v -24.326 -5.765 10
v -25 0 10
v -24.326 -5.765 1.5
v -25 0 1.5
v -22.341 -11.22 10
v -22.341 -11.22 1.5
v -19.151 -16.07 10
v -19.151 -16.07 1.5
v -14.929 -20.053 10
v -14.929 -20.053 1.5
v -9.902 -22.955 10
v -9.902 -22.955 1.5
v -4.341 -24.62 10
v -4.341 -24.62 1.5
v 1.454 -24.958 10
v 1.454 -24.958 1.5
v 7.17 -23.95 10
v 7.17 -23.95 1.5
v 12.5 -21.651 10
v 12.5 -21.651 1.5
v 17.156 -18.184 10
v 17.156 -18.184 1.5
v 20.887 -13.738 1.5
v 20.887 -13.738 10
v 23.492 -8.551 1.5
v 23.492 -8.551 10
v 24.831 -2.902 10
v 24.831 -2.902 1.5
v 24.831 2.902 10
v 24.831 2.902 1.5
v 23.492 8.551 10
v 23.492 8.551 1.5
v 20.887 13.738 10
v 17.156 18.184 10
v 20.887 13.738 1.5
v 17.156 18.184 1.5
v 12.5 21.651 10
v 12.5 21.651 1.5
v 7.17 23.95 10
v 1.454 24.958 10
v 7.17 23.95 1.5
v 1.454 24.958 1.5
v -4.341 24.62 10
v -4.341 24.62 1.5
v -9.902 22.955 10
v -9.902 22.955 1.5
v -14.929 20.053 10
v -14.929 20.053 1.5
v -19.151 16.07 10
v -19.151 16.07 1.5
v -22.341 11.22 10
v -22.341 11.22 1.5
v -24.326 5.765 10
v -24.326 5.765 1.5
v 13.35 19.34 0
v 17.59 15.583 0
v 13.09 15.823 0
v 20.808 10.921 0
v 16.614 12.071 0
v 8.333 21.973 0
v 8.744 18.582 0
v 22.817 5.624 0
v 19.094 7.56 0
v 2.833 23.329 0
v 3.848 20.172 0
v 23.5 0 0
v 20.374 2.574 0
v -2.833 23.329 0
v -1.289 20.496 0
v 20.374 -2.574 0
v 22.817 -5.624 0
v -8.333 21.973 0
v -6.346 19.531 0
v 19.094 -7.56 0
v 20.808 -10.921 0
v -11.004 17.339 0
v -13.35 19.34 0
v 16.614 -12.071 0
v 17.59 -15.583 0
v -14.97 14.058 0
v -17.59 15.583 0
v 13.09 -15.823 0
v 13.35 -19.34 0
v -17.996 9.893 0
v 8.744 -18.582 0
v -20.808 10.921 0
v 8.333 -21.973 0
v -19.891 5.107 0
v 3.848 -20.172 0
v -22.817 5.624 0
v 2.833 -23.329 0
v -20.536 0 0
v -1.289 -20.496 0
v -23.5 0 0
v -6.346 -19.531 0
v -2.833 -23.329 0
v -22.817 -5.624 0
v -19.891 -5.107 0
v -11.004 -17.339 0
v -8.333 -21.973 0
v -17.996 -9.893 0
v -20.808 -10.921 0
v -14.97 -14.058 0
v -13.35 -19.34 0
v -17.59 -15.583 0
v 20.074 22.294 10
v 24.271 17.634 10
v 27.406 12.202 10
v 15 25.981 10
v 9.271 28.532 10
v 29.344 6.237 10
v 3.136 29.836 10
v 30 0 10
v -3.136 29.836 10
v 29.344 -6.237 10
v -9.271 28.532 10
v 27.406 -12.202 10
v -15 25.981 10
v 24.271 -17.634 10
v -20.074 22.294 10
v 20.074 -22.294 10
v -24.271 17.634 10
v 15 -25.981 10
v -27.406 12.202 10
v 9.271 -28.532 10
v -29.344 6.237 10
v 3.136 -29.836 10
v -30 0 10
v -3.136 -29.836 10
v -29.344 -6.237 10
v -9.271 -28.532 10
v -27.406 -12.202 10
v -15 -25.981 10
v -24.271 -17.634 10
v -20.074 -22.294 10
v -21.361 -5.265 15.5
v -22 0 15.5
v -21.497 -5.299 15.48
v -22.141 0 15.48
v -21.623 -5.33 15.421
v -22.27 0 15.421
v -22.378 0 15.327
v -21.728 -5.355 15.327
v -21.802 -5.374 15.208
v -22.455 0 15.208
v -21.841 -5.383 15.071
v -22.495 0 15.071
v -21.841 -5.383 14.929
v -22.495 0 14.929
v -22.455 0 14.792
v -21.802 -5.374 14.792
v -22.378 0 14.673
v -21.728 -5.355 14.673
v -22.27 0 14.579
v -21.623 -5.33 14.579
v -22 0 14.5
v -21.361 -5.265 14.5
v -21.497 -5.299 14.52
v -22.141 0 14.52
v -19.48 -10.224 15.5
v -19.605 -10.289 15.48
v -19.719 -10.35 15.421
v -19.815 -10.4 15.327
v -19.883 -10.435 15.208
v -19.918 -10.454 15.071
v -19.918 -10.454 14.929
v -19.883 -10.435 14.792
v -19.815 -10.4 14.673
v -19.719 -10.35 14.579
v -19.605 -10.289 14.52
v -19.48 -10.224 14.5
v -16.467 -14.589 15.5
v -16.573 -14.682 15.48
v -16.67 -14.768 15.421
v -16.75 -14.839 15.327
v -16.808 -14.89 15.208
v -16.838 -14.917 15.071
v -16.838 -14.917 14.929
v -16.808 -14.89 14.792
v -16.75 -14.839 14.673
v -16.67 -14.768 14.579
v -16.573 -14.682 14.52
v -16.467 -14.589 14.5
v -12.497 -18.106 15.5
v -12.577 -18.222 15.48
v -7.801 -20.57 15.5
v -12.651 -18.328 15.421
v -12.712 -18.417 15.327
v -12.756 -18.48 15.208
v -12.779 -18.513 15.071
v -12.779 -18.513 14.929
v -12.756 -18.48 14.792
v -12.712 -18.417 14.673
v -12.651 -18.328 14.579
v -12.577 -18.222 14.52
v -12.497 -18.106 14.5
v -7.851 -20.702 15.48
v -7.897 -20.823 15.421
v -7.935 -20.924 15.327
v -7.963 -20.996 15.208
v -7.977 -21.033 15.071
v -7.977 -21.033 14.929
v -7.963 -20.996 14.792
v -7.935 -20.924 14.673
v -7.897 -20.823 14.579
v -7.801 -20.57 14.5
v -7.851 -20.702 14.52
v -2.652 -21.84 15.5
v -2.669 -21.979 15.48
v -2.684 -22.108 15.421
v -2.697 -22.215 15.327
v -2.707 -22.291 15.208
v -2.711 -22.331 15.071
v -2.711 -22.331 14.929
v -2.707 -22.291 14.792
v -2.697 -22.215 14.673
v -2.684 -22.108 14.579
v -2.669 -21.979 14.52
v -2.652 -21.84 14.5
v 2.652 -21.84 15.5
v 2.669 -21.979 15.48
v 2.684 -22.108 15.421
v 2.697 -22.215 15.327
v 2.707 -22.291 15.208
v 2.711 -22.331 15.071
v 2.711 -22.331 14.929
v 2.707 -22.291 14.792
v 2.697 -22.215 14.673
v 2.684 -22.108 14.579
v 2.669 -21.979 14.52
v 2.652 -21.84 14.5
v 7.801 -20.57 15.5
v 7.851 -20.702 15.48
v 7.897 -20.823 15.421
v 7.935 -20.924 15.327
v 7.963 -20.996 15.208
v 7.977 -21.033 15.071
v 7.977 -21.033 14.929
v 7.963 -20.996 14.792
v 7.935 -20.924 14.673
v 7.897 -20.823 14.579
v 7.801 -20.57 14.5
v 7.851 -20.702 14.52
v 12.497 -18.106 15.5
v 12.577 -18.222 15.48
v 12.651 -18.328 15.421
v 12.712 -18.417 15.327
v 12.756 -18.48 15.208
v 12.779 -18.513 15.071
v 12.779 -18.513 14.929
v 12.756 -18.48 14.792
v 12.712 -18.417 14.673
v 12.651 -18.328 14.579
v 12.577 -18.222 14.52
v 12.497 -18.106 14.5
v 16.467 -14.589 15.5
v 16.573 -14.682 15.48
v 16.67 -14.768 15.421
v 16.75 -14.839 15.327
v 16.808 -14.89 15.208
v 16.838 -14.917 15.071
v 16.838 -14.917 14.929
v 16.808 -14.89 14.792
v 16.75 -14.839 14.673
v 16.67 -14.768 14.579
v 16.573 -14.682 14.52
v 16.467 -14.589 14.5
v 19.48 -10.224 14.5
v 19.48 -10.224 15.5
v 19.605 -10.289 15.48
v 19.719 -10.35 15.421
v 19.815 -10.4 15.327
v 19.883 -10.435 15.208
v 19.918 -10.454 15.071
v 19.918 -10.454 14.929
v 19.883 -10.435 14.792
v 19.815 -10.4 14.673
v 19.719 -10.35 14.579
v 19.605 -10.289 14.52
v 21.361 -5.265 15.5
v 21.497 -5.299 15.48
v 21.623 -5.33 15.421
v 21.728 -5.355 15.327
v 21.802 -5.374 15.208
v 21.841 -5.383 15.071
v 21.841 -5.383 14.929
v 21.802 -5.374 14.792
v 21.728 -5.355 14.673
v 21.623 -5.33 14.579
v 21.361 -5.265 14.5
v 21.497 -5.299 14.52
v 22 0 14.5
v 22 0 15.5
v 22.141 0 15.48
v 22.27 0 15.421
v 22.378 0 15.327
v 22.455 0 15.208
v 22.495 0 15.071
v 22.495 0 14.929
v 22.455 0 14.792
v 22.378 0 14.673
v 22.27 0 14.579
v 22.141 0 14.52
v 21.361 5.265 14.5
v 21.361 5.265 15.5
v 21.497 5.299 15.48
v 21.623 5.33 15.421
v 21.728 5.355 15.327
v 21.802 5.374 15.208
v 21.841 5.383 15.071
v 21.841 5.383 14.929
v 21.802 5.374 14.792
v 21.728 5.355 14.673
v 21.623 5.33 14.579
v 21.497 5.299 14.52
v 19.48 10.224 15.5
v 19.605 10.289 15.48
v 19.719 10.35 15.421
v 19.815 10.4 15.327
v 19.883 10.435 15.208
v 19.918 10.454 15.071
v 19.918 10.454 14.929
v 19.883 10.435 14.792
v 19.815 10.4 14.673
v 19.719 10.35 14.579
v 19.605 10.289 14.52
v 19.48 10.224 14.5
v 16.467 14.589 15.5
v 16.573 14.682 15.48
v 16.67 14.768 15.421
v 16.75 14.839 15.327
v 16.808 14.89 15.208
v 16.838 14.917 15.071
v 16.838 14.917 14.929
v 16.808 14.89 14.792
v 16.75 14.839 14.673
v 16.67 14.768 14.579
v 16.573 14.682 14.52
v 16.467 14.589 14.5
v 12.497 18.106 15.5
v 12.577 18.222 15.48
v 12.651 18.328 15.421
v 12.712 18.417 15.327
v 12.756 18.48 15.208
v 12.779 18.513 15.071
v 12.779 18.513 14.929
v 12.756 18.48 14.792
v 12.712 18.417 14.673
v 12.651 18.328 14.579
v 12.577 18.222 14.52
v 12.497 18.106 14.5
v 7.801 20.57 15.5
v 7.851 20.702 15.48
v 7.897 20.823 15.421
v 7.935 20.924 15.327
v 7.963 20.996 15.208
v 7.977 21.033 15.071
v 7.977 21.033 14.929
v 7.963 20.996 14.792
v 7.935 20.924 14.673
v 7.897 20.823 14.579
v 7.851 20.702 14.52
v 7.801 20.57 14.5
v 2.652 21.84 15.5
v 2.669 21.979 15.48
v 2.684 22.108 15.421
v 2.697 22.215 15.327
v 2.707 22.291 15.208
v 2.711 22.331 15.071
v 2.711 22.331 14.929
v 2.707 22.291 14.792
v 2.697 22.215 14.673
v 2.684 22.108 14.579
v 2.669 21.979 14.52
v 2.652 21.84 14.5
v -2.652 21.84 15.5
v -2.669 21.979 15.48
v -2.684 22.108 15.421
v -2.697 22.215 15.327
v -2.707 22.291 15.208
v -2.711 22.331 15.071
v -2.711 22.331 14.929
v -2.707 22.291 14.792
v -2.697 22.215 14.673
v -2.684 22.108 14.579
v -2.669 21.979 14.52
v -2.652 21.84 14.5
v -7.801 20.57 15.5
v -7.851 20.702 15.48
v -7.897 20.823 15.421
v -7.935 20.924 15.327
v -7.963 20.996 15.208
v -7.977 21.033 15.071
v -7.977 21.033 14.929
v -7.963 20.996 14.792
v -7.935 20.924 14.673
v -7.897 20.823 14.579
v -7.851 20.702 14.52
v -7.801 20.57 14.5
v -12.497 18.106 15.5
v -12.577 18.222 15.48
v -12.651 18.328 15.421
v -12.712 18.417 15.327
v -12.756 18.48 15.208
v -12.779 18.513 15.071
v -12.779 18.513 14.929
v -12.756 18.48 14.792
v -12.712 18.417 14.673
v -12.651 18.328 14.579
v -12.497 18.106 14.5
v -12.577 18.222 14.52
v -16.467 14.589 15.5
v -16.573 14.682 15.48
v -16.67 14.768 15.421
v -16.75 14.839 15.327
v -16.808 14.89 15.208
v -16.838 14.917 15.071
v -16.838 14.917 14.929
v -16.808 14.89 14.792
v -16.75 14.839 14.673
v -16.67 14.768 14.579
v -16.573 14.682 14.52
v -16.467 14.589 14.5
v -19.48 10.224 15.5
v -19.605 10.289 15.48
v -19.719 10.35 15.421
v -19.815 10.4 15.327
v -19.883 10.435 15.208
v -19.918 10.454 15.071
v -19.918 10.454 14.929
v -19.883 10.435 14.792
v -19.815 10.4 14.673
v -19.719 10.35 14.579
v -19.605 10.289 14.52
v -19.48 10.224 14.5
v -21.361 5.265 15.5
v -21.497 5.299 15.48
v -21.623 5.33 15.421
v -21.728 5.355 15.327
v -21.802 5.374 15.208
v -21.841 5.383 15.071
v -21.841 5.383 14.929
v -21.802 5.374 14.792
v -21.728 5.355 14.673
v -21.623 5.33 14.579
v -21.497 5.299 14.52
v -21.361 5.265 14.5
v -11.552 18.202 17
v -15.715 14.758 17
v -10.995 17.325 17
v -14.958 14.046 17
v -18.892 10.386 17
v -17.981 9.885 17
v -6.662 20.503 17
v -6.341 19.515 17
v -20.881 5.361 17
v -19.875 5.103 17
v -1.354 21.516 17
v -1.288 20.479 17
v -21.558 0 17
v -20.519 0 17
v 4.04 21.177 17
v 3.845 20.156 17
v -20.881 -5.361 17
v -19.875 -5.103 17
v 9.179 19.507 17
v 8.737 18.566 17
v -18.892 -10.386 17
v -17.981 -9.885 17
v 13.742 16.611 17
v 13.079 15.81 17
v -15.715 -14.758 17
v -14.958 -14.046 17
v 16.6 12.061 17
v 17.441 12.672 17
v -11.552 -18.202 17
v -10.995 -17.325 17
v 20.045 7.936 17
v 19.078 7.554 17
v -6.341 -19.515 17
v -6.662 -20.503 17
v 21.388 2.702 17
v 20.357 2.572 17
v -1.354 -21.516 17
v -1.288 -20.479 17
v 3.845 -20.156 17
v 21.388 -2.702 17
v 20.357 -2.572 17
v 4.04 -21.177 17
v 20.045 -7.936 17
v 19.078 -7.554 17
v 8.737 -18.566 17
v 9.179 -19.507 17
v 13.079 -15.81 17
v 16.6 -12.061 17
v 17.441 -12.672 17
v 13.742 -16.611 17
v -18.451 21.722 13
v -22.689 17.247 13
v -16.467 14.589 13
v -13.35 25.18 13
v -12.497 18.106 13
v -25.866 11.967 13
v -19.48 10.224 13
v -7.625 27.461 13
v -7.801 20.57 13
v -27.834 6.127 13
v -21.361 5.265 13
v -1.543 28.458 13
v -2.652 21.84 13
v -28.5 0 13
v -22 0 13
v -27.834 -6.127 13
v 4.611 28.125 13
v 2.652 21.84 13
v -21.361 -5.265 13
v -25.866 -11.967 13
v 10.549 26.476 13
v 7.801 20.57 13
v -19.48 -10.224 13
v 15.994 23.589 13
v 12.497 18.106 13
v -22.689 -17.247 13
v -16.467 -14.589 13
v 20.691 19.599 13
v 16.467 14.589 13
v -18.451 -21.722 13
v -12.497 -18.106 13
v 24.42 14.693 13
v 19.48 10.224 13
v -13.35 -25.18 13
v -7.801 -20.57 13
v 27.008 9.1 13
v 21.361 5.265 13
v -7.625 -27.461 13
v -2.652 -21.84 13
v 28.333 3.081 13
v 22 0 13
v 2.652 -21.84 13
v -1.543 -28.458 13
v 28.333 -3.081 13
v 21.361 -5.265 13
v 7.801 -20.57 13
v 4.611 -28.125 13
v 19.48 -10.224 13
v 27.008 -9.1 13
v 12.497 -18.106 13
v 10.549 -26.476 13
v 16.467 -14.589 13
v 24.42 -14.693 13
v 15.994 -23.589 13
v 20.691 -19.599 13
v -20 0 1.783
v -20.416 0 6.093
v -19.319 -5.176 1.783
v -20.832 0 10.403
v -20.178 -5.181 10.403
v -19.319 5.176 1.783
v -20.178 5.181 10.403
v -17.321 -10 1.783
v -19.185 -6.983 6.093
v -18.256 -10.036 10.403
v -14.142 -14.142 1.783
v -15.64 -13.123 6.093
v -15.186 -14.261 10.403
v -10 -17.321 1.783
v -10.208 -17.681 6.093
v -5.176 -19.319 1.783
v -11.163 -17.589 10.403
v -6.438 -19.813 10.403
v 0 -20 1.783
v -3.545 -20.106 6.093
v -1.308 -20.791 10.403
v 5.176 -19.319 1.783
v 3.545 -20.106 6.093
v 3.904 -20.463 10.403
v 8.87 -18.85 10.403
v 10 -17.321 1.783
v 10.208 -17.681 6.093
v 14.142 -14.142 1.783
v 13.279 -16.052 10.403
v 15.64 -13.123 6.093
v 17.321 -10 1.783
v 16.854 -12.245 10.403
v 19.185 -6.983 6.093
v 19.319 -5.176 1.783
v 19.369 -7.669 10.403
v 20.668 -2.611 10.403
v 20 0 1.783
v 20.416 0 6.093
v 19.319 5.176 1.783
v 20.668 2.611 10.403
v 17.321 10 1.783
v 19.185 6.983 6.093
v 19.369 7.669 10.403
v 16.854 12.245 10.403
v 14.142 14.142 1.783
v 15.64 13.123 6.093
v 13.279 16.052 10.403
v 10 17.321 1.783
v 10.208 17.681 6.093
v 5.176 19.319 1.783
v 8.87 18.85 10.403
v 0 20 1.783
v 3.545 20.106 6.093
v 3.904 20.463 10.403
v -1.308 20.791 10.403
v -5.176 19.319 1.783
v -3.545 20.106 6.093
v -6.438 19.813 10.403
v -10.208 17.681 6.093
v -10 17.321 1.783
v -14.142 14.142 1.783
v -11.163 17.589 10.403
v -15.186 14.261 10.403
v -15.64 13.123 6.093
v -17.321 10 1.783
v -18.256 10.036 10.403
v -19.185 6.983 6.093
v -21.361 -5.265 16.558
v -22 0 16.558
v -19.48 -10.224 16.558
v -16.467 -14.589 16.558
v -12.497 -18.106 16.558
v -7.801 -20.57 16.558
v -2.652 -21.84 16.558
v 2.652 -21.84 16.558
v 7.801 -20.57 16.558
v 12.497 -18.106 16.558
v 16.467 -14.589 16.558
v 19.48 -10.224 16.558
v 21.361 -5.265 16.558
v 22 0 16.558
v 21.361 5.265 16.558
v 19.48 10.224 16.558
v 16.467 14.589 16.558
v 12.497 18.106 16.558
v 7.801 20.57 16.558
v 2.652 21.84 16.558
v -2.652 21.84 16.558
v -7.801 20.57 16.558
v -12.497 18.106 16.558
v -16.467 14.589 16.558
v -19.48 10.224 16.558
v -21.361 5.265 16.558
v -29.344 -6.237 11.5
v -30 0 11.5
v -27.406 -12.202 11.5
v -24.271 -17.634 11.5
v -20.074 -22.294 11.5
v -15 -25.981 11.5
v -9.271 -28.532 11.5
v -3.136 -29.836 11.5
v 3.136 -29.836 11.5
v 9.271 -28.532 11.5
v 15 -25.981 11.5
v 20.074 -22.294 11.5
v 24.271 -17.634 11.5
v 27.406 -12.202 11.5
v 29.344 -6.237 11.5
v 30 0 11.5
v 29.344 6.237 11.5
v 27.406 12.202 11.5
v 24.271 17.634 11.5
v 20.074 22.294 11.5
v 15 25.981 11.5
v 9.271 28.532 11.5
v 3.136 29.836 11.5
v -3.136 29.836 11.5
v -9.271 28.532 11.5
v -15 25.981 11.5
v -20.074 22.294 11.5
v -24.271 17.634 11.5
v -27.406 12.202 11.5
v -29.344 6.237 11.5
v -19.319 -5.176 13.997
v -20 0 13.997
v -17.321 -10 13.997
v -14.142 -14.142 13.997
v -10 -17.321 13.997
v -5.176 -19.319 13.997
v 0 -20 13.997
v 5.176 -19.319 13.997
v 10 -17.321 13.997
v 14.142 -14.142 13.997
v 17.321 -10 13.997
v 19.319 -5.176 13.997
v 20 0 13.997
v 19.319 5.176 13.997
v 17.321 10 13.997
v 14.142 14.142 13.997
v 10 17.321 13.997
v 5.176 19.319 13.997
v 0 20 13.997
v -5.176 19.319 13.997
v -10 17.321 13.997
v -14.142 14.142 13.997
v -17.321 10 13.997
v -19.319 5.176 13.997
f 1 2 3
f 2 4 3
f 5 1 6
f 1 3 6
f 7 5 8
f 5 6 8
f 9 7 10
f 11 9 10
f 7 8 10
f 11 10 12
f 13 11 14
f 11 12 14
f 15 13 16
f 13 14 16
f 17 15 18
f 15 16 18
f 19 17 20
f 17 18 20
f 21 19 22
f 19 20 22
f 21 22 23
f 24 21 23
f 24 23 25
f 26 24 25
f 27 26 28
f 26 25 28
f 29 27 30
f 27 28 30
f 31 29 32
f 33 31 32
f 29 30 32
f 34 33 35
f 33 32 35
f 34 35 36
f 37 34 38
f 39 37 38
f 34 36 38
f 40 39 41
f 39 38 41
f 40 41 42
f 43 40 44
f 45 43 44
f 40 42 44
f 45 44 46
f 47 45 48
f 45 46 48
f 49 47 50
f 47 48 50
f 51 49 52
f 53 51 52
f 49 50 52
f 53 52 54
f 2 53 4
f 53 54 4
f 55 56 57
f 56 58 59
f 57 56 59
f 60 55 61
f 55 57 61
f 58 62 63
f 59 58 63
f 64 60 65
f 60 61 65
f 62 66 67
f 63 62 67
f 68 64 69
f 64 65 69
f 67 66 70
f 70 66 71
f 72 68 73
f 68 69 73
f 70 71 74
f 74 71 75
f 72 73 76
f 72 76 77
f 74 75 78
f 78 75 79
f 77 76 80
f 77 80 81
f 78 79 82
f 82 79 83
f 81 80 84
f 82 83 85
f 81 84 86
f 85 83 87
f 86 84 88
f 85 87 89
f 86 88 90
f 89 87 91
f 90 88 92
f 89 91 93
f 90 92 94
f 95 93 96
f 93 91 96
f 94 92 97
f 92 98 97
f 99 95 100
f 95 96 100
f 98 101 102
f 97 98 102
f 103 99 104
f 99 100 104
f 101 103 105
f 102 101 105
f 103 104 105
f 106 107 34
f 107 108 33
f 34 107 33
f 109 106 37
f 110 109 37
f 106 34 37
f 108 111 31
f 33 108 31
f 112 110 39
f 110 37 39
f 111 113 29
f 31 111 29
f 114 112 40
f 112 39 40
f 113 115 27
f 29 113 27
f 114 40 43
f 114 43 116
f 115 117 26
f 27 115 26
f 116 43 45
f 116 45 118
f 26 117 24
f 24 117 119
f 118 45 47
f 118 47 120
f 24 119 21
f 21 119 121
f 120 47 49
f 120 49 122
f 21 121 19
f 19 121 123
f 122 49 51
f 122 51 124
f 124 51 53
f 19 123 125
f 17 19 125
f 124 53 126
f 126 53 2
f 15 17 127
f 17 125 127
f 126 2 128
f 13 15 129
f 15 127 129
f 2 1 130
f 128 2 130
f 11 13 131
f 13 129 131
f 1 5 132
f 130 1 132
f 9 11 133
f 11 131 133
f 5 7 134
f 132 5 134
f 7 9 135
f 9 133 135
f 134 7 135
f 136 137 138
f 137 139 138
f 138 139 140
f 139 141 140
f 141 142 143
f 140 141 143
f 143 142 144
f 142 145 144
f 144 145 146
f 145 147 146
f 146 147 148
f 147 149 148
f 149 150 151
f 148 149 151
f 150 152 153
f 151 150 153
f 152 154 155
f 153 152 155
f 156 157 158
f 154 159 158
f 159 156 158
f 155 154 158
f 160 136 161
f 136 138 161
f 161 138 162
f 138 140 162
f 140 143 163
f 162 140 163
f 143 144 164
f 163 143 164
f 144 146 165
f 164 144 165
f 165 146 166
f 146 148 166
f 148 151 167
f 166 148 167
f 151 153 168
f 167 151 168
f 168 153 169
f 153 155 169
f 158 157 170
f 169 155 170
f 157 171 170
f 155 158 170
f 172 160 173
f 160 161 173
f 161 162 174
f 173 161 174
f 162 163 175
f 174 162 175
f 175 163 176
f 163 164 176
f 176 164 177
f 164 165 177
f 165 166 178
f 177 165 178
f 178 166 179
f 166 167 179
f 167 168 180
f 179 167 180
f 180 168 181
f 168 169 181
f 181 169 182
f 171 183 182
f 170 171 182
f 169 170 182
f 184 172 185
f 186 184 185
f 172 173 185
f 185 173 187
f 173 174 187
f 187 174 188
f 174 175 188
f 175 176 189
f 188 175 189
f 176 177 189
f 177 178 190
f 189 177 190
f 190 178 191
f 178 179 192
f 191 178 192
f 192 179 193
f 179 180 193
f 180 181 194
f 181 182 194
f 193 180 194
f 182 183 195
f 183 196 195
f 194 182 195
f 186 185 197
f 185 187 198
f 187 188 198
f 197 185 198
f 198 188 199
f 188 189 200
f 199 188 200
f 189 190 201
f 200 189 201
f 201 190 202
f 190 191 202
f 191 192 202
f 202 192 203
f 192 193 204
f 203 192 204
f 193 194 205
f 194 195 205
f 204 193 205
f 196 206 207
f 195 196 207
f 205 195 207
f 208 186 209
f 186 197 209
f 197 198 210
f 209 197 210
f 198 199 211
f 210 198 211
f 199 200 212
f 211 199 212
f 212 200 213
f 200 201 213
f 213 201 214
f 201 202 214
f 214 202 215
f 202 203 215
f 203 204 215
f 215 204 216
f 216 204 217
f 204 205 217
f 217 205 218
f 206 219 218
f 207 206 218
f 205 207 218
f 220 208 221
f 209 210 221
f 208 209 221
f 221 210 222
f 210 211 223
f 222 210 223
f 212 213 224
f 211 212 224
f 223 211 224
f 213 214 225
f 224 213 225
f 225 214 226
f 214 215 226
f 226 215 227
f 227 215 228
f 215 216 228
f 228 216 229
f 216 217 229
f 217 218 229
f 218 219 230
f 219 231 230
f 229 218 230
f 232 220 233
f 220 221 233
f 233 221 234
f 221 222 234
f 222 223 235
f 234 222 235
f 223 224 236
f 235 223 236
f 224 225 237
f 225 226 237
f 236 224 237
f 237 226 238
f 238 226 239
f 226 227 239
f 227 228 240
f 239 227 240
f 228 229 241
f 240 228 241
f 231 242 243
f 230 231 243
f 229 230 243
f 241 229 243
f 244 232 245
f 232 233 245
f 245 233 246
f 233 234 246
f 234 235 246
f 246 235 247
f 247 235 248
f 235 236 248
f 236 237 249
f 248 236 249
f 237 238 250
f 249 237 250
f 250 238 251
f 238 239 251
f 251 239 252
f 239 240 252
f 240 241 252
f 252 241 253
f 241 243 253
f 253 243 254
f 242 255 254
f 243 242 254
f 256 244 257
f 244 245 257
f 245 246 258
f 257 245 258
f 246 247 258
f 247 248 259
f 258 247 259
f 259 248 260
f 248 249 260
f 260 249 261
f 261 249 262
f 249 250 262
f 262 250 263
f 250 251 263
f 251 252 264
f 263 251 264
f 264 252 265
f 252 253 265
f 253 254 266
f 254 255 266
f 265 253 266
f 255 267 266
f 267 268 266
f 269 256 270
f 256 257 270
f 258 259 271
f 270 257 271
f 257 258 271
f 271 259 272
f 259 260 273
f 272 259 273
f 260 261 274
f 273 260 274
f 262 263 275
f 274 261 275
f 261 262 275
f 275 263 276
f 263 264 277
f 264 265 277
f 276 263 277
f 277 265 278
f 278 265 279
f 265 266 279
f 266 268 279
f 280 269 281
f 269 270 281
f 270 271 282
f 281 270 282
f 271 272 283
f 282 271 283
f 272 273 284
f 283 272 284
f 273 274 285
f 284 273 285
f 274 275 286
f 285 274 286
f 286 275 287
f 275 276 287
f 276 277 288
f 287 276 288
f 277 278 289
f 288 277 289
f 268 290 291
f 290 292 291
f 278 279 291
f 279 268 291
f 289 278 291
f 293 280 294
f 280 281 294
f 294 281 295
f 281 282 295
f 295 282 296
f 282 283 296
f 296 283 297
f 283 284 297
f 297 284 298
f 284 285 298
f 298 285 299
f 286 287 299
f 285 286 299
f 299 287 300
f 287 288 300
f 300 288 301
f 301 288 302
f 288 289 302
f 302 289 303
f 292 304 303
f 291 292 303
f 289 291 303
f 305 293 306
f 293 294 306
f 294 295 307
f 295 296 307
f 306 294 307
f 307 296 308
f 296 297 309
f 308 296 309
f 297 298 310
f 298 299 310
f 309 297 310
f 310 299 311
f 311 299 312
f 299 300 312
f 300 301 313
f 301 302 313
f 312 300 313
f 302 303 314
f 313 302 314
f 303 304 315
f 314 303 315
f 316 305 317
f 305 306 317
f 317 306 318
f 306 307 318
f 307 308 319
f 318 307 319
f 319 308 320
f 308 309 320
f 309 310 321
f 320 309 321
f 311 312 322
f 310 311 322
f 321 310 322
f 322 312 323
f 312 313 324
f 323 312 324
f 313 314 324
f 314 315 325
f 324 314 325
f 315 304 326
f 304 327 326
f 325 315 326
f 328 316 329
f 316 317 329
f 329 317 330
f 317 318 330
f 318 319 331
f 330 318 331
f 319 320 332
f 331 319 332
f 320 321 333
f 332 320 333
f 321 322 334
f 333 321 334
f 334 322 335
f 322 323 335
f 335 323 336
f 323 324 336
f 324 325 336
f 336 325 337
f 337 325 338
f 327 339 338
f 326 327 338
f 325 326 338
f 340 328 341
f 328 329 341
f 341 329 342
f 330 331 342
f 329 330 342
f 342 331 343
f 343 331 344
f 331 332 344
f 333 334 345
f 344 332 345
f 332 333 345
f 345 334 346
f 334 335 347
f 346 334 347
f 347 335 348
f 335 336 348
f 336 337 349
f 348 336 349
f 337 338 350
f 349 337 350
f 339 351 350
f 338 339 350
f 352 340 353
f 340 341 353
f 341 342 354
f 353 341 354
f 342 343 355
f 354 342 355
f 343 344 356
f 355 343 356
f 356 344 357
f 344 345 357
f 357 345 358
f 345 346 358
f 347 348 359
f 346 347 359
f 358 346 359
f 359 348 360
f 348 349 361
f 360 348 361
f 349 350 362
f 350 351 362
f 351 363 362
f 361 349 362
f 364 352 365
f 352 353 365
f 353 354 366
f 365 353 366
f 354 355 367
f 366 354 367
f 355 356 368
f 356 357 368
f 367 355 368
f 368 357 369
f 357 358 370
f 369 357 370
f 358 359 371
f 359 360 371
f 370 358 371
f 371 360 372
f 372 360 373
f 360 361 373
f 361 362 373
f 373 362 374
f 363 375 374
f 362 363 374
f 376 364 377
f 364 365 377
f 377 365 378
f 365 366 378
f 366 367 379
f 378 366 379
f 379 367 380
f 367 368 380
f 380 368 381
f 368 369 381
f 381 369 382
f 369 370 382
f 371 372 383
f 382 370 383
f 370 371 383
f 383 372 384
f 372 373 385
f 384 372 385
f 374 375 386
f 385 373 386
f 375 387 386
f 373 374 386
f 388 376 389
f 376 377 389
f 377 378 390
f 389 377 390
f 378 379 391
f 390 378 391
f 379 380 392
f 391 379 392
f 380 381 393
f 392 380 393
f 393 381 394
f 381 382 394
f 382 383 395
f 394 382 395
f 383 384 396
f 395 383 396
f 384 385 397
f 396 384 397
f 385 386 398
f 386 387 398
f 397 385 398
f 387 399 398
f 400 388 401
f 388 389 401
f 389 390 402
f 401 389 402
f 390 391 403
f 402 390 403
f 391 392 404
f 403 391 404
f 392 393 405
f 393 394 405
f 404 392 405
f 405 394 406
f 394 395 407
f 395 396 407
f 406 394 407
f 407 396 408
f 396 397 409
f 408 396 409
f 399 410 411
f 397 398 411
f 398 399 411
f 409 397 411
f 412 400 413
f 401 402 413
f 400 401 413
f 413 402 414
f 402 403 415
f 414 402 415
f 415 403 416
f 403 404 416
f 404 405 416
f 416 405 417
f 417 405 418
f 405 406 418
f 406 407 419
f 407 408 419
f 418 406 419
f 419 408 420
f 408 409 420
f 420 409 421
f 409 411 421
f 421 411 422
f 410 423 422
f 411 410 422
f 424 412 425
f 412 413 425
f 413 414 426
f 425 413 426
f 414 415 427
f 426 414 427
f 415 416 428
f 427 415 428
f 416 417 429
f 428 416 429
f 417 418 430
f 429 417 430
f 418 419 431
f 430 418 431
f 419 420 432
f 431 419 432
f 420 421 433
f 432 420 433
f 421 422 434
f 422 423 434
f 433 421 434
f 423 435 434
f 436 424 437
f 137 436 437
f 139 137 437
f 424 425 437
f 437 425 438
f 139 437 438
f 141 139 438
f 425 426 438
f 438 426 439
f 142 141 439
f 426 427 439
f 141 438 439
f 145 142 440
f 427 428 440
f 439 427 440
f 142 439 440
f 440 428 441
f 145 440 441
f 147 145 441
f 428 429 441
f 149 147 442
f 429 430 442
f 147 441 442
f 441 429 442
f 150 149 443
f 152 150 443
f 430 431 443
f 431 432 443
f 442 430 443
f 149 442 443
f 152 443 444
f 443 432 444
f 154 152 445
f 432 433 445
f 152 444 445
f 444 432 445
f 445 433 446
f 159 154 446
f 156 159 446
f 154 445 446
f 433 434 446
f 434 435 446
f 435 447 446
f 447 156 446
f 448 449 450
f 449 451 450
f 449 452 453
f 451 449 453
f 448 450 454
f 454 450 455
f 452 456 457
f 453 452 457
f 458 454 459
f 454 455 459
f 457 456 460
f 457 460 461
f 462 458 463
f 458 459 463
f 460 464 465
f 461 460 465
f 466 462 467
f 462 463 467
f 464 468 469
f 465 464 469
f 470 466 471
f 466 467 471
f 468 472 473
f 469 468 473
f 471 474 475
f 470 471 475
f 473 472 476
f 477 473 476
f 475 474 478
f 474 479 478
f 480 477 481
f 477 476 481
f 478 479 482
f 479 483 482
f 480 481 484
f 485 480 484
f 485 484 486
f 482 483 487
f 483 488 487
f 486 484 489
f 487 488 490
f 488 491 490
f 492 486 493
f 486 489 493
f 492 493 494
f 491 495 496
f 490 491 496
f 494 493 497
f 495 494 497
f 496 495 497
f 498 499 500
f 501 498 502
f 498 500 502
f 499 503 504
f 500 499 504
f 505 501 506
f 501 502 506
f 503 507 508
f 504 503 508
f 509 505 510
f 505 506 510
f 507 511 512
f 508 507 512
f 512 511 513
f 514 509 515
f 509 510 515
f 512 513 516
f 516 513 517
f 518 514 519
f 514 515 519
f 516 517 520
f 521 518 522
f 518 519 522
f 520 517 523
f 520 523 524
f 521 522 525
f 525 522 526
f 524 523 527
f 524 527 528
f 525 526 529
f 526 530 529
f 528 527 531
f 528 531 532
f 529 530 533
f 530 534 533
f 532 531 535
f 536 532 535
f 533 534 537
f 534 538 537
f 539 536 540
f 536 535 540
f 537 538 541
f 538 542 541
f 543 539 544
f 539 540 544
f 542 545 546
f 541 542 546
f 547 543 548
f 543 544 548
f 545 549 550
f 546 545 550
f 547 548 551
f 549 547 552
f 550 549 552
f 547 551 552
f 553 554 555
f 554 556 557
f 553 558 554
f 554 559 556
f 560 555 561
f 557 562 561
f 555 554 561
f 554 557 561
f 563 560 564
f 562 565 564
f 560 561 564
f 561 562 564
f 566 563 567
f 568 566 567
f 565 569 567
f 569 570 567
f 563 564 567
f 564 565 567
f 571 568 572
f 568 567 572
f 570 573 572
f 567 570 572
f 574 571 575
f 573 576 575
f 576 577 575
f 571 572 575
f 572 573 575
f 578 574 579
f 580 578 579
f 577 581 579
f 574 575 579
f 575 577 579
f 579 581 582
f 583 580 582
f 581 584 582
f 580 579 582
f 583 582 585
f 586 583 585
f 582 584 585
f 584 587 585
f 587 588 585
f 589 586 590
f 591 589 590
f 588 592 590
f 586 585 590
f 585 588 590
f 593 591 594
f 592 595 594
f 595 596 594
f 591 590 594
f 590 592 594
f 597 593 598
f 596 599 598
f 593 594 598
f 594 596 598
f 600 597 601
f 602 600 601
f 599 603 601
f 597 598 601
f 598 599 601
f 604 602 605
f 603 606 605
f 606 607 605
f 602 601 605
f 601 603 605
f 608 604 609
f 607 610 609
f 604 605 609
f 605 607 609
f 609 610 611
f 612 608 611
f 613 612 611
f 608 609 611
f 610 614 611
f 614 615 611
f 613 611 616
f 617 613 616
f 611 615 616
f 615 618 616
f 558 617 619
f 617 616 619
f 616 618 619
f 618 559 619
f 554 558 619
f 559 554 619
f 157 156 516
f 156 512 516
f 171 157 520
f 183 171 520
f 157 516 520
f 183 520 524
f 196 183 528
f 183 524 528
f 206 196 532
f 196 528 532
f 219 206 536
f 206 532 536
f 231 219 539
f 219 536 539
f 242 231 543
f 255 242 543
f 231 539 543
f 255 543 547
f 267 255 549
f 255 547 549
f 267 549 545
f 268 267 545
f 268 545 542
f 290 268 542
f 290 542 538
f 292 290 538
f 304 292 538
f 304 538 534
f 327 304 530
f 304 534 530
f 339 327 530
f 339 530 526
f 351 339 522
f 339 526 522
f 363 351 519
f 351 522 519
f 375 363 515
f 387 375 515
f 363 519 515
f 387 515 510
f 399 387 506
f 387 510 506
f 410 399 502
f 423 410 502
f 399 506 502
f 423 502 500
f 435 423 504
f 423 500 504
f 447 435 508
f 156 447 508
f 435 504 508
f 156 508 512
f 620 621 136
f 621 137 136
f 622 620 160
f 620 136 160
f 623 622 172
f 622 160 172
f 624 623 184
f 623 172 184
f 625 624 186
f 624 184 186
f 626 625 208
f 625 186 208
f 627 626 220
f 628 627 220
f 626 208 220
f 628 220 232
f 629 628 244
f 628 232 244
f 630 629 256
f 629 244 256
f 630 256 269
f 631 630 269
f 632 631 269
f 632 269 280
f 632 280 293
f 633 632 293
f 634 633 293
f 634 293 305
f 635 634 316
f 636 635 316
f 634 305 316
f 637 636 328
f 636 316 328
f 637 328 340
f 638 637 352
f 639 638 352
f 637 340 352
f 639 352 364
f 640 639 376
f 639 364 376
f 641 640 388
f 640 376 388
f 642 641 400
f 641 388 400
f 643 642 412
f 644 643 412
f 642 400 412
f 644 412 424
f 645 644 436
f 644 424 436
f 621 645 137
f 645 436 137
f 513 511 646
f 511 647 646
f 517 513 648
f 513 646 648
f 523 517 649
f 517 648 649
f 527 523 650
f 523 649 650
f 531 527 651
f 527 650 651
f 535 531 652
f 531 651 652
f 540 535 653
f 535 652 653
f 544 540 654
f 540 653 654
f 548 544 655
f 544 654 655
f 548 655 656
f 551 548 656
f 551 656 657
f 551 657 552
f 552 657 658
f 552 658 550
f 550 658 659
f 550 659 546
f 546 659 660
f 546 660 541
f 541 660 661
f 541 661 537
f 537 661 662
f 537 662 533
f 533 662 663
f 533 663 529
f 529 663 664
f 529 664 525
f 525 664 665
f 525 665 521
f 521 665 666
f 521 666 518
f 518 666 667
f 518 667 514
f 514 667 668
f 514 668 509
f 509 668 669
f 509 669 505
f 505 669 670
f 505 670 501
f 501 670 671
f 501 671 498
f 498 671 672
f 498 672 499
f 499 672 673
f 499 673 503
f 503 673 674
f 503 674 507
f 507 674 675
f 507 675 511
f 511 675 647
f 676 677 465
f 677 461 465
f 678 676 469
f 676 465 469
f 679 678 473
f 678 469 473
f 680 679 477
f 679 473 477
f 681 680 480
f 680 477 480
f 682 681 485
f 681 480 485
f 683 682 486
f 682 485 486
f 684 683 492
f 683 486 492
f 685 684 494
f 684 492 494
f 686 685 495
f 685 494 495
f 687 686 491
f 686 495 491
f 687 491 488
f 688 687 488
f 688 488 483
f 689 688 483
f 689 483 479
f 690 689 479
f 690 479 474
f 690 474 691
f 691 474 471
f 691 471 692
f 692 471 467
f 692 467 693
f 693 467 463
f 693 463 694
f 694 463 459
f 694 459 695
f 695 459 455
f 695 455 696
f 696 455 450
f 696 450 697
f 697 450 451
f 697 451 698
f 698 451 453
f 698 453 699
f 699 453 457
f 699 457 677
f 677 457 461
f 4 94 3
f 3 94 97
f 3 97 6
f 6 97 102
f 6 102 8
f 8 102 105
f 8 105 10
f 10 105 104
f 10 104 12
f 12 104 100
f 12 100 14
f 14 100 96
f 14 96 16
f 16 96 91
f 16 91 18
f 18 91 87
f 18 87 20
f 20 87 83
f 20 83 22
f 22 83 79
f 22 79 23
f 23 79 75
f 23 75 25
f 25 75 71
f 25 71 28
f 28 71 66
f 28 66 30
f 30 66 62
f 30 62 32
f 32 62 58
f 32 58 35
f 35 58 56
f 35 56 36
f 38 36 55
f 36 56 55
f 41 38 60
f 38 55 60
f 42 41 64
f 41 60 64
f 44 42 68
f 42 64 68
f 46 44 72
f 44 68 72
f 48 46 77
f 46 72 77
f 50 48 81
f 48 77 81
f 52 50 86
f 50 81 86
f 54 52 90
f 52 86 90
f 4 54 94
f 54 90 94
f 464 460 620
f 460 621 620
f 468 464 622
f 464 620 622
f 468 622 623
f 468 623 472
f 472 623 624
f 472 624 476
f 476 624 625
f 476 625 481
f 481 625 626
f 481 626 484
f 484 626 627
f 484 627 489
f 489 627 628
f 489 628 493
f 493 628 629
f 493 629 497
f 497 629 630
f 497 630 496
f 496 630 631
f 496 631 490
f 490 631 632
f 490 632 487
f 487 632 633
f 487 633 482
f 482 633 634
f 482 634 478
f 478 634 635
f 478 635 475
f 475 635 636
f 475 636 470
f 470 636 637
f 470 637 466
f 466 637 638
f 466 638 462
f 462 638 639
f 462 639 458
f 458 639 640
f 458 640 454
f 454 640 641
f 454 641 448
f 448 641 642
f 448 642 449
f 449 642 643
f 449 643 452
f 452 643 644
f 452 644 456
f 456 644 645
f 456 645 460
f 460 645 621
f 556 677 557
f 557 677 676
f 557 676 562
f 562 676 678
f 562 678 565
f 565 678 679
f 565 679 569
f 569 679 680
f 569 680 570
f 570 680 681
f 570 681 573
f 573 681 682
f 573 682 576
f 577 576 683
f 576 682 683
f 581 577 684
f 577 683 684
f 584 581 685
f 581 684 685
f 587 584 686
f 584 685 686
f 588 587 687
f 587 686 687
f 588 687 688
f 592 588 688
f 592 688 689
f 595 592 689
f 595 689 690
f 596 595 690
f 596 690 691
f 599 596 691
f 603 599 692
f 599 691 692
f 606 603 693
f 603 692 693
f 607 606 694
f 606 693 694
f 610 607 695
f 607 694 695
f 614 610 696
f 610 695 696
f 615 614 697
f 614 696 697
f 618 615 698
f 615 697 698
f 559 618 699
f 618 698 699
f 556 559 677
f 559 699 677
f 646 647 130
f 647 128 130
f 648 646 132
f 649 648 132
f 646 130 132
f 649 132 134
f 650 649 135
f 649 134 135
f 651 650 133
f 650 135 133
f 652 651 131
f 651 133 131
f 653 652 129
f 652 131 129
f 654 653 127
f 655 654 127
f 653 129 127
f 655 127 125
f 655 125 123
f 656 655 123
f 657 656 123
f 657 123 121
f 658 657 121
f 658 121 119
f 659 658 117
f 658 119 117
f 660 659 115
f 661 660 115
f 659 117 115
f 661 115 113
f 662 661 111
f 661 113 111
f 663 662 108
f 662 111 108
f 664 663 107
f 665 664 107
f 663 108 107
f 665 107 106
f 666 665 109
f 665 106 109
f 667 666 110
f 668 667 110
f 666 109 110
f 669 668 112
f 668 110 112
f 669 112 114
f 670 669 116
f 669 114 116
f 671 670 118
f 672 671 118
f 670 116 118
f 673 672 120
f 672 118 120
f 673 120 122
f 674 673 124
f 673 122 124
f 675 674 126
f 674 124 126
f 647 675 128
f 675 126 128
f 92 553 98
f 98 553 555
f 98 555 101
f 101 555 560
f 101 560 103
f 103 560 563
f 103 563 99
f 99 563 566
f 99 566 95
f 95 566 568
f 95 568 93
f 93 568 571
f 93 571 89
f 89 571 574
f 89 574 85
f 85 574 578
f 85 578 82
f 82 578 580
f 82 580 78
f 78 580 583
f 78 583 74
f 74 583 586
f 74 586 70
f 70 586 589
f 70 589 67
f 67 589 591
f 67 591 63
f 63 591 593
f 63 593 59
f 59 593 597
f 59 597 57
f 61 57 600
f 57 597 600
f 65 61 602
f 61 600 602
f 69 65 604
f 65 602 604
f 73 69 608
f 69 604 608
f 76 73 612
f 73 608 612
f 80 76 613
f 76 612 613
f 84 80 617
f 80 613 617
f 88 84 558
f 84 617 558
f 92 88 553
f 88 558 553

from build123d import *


with BuildPart() as f1:
    # F0 (on Front) → F1 (revolve)
    with BuildSketch(Plane.XZ):
        with BuildLine():
            Line((-23.5, 0), (-20.53616, 0))
            Line((-20.53616, 0), (-20, 1.783461))
            Line((-20, 1.783461), (-20.832418, 10.402767))
            Line((-20.832418, 10.402767), (-20, 13.996847))
            Line((-20, 13.996847), (-20.519255, 17))
            Line((-20.519255, 17), (-21.558487, 17))
            Line((-21.558487, 17), (-22, 16.558487))
            Line((-22, 16.558487), (-22, 15.5))
            ThreePointArc((-22, 15.5), (-22.5, 15), (-22, 14.5))
            Line((-22, 14.5), (-22, 13))
            Line((-22, 13), (-28.5, 13))
            Line((-28.5, 13), (-30, 11.5))
            Line((-30, 11.5), (-30, 10))
            Line((-30, 10), (-25, 10))
            Line((-25, 10), (-25, 1.5))
            Line((-25, 1.5), (-23.5, 0))
        make_face()
    revolve(axis=Axis((0, 0, 21.225085), (0, 0, 1)))


solid = f1.part
